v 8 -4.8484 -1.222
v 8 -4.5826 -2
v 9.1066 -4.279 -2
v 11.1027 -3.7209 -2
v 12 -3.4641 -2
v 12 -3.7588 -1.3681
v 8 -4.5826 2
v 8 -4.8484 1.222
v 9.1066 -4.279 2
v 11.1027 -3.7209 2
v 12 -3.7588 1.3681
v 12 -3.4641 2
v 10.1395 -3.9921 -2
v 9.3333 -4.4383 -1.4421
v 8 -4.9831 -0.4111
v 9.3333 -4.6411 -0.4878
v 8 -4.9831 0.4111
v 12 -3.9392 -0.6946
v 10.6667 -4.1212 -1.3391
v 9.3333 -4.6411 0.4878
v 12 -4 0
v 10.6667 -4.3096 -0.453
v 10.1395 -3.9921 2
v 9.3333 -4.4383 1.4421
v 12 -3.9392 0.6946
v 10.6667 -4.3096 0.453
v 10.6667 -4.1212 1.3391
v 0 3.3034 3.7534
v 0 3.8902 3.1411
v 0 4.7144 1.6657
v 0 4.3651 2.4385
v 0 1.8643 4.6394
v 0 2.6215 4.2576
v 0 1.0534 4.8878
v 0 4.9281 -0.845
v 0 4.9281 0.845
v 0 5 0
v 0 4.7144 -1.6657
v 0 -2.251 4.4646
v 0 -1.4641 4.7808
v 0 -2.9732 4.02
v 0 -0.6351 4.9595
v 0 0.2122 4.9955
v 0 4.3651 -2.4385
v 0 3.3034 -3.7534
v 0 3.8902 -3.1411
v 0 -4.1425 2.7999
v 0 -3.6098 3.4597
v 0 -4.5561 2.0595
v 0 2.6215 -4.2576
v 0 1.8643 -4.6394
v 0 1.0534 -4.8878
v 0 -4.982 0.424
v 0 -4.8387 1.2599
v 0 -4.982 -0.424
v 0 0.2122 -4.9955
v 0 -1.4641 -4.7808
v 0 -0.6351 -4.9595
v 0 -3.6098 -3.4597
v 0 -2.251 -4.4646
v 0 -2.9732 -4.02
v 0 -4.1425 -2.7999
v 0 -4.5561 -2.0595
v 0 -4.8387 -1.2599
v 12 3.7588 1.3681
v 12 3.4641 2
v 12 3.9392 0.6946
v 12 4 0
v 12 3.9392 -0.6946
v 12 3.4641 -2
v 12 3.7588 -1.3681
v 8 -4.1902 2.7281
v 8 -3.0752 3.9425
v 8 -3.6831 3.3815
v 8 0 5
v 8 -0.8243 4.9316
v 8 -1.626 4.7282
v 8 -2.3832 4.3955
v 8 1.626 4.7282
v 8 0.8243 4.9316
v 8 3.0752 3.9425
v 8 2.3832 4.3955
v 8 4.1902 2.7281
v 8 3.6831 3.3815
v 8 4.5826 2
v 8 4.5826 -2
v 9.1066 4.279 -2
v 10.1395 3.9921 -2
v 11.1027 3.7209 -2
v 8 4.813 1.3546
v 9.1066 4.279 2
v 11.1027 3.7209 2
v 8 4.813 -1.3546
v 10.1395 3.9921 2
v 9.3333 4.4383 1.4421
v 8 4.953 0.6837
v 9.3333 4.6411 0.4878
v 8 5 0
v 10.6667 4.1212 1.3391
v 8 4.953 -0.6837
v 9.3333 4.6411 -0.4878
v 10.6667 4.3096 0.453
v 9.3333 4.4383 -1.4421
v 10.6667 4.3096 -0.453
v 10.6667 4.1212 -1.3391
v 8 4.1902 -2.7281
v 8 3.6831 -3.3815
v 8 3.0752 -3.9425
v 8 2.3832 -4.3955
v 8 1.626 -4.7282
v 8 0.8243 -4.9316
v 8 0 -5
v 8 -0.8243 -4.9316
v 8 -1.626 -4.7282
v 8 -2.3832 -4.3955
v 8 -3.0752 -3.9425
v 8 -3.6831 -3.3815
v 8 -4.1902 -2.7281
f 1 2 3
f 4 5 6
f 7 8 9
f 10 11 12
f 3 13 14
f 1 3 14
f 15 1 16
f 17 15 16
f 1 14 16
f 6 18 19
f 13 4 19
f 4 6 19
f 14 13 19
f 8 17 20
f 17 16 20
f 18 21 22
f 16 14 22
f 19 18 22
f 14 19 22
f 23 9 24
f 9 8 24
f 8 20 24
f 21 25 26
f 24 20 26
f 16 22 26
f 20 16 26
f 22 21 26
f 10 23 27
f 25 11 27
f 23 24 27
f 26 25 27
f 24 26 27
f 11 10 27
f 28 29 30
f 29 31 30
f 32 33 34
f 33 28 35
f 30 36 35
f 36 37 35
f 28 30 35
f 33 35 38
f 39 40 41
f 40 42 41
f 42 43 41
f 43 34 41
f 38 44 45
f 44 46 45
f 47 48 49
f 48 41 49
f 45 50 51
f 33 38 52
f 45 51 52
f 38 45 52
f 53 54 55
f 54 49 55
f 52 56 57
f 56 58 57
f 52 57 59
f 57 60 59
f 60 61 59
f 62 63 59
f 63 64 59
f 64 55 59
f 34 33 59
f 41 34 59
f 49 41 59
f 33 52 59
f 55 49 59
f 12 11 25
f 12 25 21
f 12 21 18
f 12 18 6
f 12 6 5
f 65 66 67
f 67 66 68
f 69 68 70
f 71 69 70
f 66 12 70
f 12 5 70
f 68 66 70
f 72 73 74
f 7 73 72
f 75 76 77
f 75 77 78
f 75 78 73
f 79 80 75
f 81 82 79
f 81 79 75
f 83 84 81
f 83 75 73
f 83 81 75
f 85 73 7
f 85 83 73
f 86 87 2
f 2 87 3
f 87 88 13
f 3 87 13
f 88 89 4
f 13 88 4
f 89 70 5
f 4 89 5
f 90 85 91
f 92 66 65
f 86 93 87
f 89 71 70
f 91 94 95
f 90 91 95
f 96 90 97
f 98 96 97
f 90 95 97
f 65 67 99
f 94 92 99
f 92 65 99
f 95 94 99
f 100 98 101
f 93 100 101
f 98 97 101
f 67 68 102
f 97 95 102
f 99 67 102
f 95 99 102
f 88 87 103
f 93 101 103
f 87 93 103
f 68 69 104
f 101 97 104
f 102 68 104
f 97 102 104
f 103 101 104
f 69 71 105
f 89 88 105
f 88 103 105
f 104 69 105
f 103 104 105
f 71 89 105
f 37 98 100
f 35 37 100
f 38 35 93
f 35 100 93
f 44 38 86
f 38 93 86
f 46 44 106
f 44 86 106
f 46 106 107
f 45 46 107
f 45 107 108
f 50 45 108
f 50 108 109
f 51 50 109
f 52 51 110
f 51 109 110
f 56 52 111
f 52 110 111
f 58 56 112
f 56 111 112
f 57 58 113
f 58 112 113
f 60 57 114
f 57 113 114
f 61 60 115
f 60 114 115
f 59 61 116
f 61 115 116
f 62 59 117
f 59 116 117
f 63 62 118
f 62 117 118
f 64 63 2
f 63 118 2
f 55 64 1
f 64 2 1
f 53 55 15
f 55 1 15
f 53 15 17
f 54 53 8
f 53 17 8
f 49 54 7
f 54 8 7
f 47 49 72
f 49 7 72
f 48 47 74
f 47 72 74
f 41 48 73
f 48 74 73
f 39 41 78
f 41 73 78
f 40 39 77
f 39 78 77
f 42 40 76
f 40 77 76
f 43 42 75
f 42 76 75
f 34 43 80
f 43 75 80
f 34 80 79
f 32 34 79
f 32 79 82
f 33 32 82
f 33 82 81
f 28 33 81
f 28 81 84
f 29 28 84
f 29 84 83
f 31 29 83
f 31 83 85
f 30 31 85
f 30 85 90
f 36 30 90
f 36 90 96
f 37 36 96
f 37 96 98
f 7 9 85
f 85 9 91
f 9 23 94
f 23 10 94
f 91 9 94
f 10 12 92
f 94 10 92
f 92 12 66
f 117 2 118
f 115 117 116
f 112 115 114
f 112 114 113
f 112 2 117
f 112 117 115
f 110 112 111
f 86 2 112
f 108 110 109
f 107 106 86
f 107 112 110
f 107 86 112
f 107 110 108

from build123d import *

# Parameters (mm, degrees)
CUT_EXTRUDE1_DEPTH = 4


with BuildPart() as part:
    # Sketch1 → Revolve1 (revolve)
    with BuildSketch(Plane.XY):
        Polygon((0, 0), (0, 5), (8, 5), (12, 4), (12, 0), align=None)
    revolve(axis=Axis((12, 0, 0), (-1, 0, 0)))

    # Sketch2 → Cut-Extrude1 (cut)
    with BuildSketch(Plane(origin=(12, 0, 0), x_dir=(0, 0, -1), z_dir=(1, 0, 0))):
        with BuildLine():
            Line((-2, -3.464101615), (-2, 3.464101615))
            ThreePointArc((-2, 3.464101615), (-4, 0), (-2, -3.464101615))
        make_face()
        with BuildLine():
            Line((-2, 3.464101615), (-2, 4.582575695))
            ThreePointArc((-2, 4.582575695), (-5, 0), (-2, -4.582575695))
            Line((-2, -4.582575695), (-2, -3.464101615))
            ThreePointArc((-2, -3.464101615), (-4, 0), (-2, 3.464101615))
        make_face()
        with BuildLine():
            ThreePointArc((4, 0), (3.464101615, 2), (2, 3.464101615))
            Line((2, 3.464101615), (2, -3.464101615))
            ThreePointArc((2, -3.464101615), (3.464101615, -2), (4, 0))
        make_face()
        with BuildLine():
            ThreePointArc((5, 0), (4.183300133, 2.738612788), (2, 4.582575695))
            Line((2, 4.582575695), (2, 3.464101615))
            ThreePointArc((2, 3.464101615), (3.464101615, 2), (4, 0))
            ThreePointArc((4, 0), (3.464101615, -2), (2, -3.464101615))
            Line((2, -3.464101615), (2, -4.582575695))
            ThreePointArc((2, -4.582575695), (4.183300133, -2.738612788), (5, 0))
        make_face()
    extrude(amount=-CUT_EXTRUDE1_DEPTH, mode=Mode.SUBTRACT)


solid = part.part
